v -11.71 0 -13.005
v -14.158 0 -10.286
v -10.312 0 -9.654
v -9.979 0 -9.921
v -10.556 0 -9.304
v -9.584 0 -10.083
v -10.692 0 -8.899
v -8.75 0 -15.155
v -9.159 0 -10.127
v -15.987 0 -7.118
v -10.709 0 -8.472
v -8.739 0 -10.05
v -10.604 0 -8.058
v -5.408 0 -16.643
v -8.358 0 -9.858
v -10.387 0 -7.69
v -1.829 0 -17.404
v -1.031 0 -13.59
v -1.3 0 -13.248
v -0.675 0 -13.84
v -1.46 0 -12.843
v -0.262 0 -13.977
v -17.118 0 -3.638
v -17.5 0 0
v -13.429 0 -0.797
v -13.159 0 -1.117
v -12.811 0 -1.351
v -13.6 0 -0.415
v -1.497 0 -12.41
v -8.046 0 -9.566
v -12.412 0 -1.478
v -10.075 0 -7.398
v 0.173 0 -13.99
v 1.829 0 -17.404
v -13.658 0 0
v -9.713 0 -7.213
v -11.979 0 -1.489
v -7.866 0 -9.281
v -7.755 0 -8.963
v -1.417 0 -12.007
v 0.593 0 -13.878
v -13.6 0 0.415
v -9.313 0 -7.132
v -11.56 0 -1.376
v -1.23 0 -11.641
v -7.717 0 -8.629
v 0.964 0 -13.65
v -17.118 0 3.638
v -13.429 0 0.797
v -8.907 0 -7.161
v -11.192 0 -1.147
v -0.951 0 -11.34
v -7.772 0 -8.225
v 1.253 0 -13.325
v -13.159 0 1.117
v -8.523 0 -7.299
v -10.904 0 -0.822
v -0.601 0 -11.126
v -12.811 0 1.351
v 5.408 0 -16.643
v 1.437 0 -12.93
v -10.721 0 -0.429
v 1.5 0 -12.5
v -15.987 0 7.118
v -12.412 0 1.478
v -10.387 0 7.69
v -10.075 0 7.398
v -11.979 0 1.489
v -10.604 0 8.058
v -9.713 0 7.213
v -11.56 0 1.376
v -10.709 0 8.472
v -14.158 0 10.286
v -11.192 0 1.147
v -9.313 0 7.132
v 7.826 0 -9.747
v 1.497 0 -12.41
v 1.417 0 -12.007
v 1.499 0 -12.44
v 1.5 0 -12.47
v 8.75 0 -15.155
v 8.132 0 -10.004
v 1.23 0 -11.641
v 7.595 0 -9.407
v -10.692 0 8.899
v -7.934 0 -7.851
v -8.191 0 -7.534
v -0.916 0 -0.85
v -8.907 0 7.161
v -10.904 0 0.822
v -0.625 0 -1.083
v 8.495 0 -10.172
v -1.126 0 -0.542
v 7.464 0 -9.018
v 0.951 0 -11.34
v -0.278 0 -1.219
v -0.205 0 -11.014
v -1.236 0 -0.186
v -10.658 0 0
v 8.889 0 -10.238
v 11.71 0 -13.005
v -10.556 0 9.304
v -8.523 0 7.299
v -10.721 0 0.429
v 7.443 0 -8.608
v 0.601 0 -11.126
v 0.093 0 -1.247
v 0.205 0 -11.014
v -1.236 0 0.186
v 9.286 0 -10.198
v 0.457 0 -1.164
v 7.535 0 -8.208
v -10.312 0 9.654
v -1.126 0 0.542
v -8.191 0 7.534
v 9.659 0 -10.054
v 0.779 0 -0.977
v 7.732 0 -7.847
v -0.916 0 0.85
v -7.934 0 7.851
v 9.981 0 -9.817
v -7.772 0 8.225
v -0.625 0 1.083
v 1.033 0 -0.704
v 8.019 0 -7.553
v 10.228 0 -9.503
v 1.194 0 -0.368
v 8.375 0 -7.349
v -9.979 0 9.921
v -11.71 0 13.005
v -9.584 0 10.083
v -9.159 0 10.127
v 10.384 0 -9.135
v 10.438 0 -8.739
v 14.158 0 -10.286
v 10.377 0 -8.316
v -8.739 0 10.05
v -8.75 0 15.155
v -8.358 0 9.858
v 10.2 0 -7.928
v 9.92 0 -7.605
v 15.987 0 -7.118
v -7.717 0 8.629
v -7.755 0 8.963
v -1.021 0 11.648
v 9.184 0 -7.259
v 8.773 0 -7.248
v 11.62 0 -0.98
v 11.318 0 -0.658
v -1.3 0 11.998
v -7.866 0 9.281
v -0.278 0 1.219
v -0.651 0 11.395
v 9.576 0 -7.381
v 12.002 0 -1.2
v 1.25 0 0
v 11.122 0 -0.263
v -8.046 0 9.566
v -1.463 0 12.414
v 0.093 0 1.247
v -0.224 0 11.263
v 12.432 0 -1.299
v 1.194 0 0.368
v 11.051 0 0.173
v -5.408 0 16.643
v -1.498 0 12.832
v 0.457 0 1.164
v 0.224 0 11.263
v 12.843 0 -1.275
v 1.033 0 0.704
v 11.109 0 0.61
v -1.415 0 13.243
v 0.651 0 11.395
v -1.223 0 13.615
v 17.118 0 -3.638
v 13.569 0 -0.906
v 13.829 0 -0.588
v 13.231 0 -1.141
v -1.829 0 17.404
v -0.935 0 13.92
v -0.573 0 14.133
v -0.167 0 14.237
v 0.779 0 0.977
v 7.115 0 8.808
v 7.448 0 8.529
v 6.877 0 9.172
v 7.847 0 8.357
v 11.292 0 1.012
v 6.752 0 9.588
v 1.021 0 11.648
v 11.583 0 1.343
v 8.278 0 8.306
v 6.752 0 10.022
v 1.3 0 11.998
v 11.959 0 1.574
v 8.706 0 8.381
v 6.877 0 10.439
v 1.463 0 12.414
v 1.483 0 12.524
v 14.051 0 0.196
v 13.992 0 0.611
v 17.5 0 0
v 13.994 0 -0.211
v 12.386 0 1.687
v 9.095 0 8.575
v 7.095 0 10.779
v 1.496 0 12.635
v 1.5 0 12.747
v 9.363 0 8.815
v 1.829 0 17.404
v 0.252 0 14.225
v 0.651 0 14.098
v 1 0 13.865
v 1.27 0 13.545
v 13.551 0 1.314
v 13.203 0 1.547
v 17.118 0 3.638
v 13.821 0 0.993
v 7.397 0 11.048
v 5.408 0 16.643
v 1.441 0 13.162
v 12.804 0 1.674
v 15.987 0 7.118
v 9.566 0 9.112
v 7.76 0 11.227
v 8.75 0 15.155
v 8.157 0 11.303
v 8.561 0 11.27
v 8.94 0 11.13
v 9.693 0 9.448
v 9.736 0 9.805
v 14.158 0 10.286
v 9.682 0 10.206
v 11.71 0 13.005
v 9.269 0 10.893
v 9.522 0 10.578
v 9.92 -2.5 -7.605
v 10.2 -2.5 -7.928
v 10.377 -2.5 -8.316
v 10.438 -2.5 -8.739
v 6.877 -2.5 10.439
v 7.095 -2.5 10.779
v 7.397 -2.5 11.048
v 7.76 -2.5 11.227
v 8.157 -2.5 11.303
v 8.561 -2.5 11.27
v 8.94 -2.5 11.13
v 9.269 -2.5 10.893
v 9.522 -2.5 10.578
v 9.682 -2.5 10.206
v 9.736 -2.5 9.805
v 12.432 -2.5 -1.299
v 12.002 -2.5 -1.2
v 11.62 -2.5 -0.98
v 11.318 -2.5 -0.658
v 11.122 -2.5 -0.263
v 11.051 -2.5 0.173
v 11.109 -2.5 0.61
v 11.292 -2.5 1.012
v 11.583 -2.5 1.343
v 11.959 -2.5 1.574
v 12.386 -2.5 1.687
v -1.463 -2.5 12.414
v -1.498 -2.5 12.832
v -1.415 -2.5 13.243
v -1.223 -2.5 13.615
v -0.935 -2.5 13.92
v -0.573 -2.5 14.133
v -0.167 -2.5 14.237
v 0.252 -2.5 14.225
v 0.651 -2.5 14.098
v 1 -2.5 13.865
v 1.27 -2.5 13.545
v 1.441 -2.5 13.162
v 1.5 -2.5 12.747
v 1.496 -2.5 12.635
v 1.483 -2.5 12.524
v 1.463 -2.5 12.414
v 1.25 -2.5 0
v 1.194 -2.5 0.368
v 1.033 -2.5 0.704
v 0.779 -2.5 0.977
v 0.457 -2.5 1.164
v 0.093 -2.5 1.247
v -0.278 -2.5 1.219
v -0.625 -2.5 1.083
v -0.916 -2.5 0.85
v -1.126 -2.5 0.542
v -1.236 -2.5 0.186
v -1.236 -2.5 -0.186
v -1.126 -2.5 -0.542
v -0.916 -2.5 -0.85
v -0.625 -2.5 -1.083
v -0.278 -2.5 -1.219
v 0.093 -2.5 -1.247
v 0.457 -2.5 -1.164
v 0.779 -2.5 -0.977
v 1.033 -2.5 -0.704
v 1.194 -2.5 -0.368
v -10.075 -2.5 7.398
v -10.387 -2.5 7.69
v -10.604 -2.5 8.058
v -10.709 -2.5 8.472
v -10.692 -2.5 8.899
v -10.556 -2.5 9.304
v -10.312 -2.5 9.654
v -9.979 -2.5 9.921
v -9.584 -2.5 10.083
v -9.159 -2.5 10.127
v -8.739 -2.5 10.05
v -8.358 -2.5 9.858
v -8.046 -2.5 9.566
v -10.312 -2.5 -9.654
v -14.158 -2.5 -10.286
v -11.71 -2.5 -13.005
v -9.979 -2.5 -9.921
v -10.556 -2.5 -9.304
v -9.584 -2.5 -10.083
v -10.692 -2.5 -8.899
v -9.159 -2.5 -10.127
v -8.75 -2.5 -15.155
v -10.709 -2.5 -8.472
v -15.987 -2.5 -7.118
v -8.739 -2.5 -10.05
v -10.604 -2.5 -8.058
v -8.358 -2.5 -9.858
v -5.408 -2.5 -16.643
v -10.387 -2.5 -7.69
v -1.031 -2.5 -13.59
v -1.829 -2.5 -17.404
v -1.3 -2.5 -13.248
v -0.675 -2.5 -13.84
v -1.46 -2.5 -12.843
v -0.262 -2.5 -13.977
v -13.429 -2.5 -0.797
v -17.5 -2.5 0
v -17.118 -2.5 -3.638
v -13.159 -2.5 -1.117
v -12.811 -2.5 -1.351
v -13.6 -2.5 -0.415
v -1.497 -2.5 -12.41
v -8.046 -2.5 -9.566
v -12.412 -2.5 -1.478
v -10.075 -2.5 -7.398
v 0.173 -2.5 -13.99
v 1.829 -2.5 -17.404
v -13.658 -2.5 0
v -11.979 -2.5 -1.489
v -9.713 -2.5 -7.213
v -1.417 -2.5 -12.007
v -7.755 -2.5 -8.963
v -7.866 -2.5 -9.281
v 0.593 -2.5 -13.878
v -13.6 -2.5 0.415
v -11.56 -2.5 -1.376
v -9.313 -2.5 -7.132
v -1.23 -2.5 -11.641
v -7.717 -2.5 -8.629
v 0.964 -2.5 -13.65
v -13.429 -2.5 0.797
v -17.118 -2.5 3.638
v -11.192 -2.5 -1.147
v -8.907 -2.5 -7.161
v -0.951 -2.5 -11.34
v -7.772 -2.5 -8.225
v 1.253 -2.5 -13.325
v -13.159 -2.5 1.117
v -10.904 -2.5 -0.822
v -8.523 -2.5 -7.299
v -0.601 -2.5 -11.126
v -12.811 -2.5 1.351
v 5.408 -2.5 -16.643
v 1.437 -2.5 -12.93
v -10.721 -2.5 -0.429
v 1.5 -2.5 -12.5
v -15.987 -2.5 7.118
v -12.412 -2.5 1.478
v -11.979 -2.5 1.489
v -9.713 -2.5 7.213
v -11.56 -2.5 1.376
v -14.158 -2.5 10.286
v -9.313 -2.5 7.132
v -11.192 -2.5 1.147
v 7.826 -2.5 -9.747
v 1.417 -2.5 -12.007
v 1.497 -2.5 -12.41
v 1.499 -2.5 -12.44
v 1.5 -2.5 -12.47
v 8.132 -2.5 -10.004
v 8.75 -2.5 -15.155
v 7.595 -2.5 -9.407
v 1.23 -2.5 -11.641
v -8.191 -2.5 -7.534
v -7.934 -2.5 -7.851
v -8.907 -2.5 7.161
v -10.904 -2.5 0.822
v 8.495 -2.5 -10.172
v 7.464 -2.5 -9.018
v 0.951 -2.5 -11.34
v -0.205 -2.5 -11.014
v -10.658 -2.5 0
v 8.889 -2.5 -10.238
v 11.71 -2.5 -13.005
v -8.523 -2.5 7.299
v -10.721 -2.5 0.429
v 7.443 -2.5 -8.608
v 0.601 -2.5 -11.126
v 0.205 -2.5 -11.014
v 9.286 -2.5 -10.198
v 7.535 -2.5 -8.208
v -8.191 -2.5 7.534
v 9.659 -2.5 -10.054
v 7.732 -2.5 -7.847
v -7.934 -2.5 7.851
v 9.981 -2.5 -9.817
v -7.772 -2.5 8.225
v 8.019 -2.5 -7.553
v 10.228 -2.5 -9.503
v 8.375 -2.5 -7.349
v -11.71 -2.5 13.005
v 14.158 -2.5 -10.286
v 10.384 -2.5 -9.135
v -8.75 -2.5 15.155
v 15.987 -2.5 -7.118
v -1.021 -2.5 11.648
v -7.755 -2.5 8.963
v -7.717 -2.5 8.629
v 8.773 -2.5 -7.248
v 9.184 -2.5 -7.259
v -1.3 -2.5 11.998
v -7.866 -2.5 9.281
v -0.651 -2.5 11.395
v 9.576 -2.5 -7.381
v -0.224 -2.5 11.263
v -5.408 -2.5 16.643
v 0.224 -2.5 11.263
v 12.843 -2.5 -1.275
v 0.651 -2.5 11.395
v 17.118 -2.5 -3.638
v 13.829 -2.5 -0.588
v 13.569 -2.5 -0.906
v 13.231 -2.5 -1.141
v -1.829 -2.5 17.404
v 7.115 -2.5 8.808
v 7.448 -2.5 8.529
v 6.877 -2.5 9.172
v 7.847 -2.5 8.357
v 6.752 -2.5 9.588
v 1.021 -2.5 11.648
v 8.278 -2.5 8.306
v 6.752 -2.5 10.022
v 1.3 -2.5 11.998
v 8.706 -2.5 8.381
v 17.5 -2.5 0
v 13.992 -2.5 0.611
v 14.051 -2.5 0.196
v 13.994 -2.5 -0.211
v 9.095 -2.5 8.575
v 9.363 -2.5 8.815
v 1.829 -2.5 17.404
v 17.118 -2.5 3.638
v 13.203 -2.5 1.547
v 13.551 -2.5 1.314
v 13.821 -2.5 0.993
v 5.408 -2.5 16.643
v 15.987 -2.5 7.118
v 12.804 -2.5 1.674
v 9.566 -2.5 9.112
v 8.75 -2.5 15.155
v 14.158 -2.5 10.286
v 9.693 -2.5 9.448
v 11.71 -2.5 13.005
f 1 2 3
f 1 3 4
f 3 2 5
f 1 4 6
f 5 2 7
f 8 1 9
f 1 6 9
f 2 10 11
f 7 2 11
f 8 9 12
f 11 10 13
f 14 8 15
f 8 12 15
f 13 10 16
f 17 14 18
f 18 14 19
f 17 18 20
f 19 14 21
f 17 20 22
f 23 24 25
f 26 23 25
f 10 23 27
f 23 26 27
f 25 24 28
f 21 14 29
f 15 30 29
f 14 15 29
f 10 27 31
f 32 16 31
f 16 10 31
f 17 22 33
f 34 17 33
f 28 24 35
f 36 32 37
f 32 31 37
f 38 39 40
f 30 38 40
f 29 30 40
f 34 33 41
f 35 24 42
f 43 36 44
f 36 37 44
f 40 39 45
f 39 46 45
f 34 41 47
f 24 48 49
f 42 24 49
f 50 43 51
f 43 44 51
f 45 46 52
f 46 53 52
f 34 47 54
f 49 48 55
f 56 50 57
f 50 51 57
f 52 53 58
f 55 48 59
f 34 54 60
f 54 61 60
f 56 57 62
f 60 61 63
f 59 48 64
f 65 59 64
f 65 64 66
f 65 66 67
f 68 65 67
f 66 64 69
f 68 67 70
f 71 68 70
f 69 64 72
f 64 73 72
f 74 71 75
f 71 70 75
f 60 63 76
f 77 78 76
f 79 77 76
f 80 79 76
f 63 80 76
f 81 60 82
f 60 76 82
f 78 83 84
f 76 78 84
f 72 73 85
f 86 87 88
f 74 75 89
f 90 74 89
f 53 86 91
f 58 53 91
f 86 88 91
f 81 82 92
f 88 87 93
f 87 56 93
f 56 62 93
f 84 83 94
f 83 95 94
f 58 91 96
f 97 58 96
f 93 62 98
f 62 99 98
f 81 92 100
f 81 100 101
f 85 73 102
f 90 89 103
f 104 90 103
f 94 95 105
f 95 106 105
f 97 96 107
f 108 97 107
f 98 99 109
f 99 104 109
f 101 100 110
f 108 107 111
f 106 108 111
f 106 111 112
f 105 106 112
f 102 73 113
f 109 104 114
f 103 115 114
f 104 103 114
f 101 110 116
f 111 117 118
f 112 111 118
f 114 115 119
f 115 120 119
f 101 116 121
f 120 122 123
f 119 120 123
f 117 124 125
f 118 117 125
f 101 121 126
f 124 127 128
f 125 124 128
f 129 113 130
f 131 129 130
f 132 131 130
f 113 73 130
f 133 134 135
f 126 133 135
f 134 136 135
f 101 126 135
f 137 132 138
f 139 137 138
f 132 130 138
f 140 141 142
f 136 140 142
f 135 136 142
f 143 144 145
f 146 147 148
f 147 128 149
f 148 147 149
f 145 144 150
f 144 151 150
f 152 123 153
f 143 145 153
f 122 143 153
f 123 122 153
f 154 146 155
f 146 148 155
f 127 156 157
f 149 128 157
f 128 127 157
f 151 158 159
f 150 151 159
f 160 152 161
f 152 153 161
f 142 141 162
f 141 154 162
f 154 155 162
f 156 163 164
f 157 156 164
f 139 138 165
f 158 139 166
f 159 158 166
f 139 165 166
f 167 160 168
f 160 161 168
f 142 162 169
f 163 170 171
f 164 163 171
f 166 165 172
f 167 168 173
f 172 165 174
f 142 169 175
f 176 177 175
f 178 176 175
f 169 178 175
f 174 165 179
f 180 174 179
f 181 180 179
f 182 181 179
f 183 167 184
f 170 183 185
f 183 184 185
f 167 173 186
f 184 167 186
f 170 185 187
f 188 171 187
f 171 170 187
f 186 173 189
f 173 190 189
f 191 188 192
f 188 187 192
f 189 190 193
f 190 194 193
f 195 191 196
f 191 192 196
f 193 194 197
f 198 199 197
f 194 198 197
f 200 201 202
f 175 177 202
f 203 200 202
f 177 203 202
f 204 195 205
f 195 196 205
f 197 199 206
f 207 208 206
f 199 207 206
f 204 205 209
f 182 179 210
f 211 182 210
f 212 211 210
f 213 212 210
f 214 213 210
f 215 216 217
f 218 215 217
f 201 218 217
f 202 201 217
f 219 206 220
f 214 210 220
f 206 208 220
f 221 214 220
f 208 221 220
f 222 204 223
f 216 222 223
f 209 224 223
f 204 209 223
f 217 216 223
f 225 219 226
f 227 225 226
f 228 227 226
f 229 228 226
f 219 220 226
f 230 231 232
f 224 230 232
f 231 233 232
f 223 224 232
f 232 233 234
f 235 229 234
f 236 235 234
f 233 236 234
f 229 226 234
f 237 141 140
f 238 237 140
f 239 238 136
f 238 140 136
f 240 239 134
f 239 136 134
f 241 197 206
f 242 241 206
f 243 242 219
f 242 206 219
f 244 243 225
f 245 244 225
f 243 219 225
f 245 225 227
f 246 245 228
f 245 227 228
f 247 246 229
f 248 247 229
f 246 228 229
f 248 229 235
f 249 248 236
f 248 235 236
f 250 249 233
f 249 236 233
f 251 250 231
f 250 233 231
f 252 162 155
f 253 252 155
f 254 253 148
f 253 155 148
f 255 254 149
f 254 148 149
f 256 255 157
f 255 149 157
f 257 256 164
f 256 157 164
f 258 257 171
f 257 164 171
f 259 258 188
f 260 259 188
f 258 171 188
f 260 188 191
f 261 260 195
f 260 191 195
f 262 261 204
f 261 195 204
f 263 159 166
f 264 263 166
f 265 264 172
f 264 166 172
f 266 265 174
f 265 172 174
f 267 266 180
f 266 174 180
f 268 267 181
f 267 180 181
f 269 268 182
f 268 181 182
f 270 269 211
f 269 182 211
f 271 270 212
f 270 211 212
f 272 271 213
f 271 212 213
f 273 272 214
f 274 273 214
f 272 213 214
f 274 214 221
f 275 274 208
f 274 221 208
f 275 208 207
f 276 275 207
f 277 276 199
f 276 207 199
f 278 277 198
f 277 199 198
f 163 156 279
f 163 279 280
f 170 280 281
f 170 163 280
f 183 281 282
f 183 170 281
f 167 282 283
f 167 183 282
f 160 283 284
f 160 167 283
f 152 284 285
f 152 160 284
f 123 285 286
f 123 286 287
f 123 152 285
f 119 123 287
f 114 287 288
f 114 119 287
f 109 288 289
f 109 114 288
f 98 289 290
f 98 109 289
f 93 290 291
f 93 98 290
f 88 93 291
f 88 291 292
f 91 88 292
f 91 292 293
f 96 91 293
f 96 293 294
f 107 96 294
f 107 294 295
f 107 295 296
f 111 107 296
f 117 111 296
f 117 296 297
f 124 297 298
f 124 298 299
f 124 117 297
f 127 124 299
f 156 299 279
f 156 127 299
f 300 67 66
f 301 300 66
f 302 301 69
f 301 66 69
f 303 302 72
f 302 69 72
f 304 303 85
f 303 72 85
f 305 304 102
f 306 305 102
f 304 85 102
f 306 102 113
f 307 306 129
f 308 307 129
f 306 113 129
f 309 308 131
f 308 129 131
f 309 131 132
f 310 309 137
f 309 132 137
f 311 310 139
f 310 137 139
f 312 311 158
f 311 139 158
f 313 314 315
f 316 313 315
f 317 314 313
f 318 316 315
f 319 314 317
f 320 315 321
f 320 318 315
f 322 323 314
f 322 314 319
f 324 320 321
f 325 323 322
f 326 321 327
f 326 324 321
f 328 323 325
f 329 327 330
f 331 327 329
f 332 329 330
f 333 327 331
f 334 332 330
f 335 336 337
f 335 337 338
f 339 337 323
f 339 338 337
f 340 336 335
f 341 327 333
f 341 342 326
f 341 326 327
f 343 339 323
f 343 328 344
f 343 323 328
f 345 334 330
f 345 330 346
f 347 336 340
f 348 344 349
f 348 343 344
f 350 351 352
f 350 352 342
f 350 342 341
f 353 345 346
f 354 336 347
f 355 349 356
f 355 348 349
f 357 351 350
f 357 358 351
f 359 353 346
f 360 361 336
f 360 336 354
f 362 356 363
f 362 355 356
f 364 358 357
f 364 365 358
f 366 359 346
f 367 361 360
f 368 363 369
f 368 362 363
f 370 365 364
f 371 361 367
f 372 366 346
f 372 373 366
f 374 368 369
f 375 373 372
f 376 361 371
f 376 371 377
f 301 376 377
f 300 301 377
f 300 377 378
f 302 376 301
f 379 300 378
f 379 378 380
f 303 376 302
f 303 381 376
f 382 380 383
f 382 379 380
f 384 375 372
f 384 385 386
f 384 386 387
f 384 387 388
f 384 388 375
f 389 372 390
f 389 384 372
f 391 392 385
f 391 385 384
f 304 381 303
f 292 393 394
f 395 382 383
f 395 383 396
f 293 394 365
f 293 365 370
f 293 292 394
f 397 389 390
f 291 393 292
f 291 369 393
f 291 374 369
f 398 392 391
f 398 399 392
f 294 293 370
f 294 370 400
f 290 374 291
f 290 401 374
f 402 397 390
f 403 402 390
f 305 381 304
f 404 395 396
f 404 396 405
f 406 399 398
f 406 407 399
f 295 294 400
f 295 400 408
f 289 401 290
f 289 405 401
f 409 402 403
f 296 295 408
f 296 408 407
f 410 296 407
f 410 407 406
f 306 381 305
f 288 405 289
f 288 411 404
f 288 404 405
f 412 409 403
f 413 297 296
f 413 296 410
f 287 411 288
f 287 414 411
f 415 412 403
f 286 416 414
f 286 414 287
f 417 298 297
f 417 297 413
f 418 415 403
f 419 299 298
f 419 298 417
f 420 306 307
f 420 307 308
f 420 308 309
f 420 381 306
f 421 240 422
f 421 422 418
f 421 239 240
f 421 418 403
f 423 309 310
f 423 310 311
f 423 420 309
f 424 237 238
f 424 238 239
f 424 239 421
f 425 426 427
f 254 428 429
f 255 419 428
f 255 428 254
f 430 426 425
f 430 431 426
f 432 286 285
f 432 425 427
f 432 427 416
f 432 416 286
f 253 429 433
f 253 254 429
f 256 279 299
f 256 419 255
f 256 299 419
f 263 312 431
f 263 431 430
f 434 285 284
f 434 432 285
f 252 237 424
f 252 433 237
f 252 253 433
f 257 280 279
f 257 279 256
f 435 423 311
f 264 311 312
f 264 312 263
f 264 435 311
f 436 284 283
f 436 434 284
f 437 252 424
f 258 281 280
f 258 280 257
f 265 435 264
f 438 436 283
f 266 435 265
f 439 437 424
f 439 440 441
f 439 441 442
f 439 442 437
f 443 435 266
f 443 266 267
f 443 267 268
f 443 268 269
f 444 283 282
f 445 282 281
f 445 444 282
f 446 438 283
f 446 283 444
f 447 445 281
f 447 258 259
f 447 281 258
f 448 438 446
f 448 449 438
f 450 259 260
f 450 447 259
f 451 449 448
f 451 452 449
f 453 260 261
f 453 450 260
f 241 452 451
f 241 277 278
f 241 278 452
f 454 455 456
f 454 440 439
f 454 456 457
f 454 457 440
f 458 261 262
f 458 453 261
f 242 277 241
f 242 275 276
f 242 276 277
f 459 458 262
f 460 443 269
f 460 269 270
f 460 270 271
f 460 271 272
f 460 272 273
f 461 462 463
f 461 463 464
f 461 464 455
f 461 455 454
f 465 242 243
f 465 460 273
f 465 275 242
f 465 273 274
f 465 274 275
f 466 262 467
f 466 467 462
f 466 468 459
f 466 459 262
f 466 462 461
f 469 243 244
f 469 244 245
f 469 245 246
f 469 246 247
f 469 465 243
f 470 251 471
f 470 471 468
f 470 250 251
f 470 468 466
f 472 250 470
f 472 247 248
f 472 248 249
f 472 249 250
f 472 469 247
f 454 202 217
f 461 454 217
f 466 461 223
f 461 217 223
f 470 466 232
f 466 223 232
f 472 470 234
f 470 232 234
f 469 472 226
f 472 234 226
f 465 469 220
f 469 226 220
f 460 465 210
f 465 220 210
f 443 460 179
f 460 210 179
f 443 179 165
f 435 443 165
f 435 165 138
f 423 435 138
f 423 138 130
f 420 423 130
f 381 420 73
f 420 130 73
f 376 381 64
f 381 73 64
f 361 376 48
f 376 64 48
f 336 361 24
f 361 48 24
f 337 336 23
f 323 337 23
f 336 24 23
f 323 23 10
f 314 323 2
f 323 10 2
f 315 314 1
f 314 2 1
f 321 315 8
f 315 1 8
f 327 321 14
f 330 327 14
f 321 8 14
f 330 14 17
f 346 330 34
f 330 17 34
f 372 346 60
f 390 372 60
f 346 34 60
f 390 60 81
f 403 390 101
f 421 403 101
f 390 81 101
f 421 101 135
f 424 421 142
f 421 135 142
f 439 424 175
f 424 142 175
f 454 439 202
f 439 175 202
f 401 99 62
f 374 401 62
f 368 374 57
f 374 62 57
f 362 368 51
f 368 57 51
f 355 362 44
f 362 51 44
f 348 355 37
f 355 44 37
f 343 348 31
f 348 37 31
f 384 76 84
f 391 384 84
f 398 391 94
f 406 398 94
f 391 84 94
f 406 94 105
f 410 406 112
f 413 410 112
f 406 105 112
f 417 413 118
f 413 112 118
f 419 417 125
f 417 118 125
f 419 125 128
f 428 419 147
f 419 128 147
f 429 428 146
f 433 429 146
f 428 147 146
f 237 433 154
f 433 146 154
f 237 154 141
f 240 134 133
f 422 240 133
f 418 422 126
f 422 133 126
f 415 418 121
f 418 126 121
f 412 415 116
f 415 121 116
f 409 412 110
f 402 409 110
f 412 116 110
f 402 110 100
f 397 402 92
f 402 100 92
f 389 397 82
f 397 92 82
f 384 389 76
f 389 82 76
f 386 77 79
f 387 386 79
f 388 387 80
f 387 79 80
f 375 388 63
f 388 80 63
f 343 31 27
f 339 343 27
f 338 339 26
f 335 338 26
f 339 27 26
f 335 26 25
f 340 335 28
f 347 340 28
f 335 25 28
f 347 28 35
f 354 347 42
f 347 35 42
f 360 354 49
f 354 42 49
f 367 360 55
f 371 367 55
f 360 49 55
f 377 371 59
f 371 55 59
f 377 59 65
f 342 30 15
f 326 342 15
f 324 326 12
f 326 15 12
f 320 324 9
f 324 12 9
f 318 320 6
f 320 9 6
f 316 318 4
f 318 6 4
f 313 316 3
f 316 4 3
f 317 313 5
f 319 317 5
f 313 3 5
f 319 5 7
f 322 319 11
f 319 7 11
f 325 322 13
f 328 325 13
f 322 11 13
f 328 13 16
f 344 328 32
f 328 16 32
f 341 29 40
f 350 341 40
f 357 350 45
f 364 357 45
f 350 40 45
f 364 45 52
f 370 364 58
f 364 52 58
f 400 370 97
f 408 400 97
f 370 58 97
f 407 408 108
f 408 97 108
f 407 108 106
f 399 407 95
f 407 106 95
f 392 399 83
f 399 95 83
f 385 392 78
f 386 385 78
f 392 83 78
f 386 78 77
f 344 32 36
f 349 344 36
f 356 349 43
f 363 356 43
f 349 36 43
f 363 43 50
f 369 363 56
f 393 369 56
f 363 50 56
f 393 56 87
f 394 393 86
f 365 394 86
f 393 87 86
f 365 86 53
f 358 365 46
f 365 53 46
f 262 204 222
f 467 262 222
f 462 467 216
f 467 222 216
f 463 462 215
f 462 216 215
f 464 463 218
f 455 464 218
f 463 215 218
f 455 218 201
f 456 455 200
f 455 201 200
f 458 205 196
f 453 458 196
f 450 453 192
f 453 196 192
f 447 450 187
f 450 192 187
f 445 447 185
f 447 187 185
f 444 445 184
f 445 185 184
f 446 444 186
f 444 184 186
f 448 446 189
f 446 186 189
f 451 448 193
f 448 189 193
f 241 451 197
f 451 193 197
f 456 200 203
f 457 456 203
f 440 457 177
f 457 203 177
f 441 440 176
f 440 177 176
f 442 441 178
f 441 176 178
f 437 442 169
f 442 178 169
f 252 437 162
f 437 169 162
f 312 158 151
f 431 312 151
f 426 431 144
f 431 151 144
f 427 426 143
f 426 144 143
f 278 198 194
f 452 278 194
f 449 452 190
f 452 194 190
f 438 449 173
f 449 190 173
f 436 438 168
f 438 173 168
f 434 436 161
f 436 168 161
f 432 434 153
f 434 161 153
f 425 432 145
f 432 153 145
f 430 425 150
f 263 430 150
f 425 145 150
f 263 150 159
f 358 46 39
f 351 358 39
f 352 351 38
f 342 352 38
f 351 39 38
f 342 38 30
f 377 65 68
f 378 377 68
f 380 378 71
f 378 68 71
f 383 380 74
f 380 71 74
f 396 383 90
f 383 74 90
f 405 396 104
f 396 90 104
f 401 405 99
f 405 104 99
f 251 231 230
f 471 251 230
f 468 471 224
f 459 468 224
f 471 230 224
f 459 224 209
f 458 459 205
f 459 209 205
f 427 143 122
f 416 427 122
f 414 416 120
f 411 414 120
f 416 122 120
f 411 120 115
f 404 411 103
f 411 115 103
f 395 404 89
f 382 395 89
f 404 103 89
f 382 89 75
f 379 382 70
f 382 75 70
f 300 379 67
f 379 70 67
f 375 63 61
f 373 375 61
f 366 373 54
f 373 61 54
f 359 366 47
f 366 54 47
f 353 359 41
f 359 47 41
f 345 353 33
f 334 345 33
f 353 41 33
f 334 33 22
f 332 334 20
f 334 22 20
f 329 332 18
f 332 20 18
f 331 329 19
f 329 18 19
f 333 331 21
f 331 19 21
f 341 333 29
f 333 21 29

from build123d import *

# Parameters (mm, degrees)
F0_R     = 17.5
F0_R_2   = 2.5
F0_R_3   = 1.25
F1_DEPTH = 2.5


# Not quite as in the source:
# - the program builds the solid bodies; features that only make, move or delete a surface that nothing else refers to are left out


with BuildPart() as f1:
    # F0 (on Front) → F1 (new body)
    with BuildSketch(Plane.XZ):
        Circle(F0_R)
        with BuildLine():
            ThreePointArc((1.4972975656, -12.41), (1.4993242392, -12.454979718), (1.5, -12.5))
            ThreePointArc((1.5, -12.5), (-0.045020282, -13.9993242392), (-1.4972975656, -12.41))
            ThreePointArc((-1.4972975656, -12.41), (-4.9790100681, -11.4655771221), (-8.0460146394, -9.5661720883))
            ThreePointArc((-8.0460146394, -9.5661720883), (-10.3118696418, -9.6536659725), (-10.0753310722, -7.3984933456))
            ThreePointArc((-10.0753310722, -7.3984933456), (-11.6269109472, -4.5896559594), (-12.4122705024, -1.4783575263))
            ThreePointArc((-12.4122705024, -1.4783575263), (-13.658382684, 0), (-12.4122705024, 1.4783575263))
            ThreePointArc((-12.4122705024, 1.4783575263), (-11.6269110451, 4.5896557115), (-10.0753313878, 7.3984929159))
            ThreePointArc((-10.0753313878, 7.3984929159), (-10.3118706248, 9.6536659173), (-8.0460151958, 9.5661716203))
            ThreePointArc((-8.0460151958, 9.5661716203), (-4.9630114991, 11.472511358), (-1.4626687852, 12.4141290482))
            ThreePointArc((-1.4626687852, 12.4141290482), (-0.167324239, 14.2373289873), (1.5000009313, 12.7466907725))
            ThreePointArc((1.5000009313, 12.7466907725), (1.4906391339, 12.5793654932), (1.4626705992, 12.4141288344))
            ThreePointArc((1.4626705992, 12.4141288344), (4.2850452641, 11.7425886024), (6.8765961266, 10.4385068718))
            ThreePointArc((6.8765961266, 10.4385068718), (8.5606760335, 11.2696593384), (9.736322552, 9.8051475361))
            ThreePointArc((9.736322552, 9.8051475361), (9.5663280132, 9.1115442827), (9.0948752545, 8.5751527162))
            ThreePointArc((9.0948752545, 8.5751527162), (11.2789515194, 5.388436937), (12.3856373166, 1.6870057091))
            ThreePointArc((12.3856373166, 1.6870057091), (13.5512317227, 1.3135614646), (14.0505886972, 0.1961029484))
            ThreePointArc((14.0505886972, 0.1961029484), (13.5685677546, -0.9055860452), (12.4322971789, -1.2992254827))
            ThreePointArc((12.4322971789, -1.2992254827), (11.6124376907, -4.6261529244), (9.9200203194, -7.6054715083))
            ThreePointArc((9.9200203194, -7.6054715083), (10.3020717987, -8.1159348628), (10.4375838551, -8.7389698954))
            ThreePointArc((10.4375838551, -8.7389698954), (9.4776271369, -10.1383816482), (7.8264461833, -9.7466271161))
            ThreePointArc((7.8264461833, -9.7466271161), (4.8483438568, -11.5214392263), (1.4972975656, -12.41))
        make_face(mode=Mode.SUBTRACT)
        with BuildLine():
            ThreePointArc((-1.4972975656, -12.41), (0, -11), (1.4972975656, -12.41))
            ThreePointArc((1.4972975656, -12.41), (4.8483438568, -11.5214392263), (7.8264461833, -9.7466271161))
            ThreePointArc((7.8264461833, -9.7466271161), (7.8650737925, -7.690293508), (9.9200203194, -7.6054715083))
            ThreePointArc((9.9200203194, -7.6054715083), (11.6124376907, -4.6261529244), (12.4322971789, -1.2992254827))
            ThreePointArc((12.4322971789, -1.2992254827), (11.0507717691, 0.1726683089), (12.3856373166, 1.6870057091))
            ThreePointArc((12.3856373166, 1.6870057091), (11.2789515194, 5.388436937), (9.0948752545, 8.5751527162))
            ThreePointArc((9.0948752545, 8.5751527162), (7.271534517, 8.6565901594), (6.8765961266, 10.4385068718))
            ThreePointArc((6.8765961266, 10.4385068718), (4.2850452641, 11.7425886024), (1.4626705992, 12.4141288344))
            ThreePointArc((1.4626705992, 12.4141288344), (8.217e-07, 11.2466907725), (-1.4626687852, 12.4141290482))
            ThreePointArc((-1.4626687852, 12.4141290482), (-4.9630114991, 11.472511358), (-8.0460151958, 9.5661716203))
            ThreePointArc((-8.0460151958, 9.5661716203), (-7.8015231838, 9.1254022263), (-7.7168385163, 8.6285294965))
            ThreePointArc((-7.7168385163, 8.6285294965), (-8.5232029157, 7.298540905), (-10.0753313878, 7.3984929159))
            ThreePointArc((-10.0753313878, 7.3984929159), (-11.6269110451, 4.5896557115), (-12.4122705024, 1.4783575263))
            ThreePointArc((-12.4122705024, 1.4783575263), (-11.1916437657, 1.146915805), (-10.658382684, 0))
            ThreePointArc((-10.658382684, 0), (-11.1916437657, -1.146915805), (-12.4122705024, -1.4783575263))
            ThreePointArc((-12.4122705024, -1.4783575263), (-11.6269109472, -4.5896559594), (-10.0753310722, -7.3984933456))
            ThreePointArc((-10.0753310722, -7.3984933456), (-8.5232023173, -7.2985407313), (-7.716837585, -8.6285294965))
            ThreePointArc((-7.716837585, -8.6285294965), (-7.8015223518, -9.1254025092), (-8.0460146394, -9.5661720883))
            ThreePointArc((-8.0460146394, -9.5661720883), (-4.9790100681, -11.4655771221), (-1.4972975656, -12.41))
        make_face()
        Circle(F0_R_2, mode=Mode.SUBTRACT)
        Circle(F0_R_2)
        Circle(F0_R_3, mode=Mode.SUBTRACT)
    extrude(amount=F1_DEPTH)


solid = f1.part
